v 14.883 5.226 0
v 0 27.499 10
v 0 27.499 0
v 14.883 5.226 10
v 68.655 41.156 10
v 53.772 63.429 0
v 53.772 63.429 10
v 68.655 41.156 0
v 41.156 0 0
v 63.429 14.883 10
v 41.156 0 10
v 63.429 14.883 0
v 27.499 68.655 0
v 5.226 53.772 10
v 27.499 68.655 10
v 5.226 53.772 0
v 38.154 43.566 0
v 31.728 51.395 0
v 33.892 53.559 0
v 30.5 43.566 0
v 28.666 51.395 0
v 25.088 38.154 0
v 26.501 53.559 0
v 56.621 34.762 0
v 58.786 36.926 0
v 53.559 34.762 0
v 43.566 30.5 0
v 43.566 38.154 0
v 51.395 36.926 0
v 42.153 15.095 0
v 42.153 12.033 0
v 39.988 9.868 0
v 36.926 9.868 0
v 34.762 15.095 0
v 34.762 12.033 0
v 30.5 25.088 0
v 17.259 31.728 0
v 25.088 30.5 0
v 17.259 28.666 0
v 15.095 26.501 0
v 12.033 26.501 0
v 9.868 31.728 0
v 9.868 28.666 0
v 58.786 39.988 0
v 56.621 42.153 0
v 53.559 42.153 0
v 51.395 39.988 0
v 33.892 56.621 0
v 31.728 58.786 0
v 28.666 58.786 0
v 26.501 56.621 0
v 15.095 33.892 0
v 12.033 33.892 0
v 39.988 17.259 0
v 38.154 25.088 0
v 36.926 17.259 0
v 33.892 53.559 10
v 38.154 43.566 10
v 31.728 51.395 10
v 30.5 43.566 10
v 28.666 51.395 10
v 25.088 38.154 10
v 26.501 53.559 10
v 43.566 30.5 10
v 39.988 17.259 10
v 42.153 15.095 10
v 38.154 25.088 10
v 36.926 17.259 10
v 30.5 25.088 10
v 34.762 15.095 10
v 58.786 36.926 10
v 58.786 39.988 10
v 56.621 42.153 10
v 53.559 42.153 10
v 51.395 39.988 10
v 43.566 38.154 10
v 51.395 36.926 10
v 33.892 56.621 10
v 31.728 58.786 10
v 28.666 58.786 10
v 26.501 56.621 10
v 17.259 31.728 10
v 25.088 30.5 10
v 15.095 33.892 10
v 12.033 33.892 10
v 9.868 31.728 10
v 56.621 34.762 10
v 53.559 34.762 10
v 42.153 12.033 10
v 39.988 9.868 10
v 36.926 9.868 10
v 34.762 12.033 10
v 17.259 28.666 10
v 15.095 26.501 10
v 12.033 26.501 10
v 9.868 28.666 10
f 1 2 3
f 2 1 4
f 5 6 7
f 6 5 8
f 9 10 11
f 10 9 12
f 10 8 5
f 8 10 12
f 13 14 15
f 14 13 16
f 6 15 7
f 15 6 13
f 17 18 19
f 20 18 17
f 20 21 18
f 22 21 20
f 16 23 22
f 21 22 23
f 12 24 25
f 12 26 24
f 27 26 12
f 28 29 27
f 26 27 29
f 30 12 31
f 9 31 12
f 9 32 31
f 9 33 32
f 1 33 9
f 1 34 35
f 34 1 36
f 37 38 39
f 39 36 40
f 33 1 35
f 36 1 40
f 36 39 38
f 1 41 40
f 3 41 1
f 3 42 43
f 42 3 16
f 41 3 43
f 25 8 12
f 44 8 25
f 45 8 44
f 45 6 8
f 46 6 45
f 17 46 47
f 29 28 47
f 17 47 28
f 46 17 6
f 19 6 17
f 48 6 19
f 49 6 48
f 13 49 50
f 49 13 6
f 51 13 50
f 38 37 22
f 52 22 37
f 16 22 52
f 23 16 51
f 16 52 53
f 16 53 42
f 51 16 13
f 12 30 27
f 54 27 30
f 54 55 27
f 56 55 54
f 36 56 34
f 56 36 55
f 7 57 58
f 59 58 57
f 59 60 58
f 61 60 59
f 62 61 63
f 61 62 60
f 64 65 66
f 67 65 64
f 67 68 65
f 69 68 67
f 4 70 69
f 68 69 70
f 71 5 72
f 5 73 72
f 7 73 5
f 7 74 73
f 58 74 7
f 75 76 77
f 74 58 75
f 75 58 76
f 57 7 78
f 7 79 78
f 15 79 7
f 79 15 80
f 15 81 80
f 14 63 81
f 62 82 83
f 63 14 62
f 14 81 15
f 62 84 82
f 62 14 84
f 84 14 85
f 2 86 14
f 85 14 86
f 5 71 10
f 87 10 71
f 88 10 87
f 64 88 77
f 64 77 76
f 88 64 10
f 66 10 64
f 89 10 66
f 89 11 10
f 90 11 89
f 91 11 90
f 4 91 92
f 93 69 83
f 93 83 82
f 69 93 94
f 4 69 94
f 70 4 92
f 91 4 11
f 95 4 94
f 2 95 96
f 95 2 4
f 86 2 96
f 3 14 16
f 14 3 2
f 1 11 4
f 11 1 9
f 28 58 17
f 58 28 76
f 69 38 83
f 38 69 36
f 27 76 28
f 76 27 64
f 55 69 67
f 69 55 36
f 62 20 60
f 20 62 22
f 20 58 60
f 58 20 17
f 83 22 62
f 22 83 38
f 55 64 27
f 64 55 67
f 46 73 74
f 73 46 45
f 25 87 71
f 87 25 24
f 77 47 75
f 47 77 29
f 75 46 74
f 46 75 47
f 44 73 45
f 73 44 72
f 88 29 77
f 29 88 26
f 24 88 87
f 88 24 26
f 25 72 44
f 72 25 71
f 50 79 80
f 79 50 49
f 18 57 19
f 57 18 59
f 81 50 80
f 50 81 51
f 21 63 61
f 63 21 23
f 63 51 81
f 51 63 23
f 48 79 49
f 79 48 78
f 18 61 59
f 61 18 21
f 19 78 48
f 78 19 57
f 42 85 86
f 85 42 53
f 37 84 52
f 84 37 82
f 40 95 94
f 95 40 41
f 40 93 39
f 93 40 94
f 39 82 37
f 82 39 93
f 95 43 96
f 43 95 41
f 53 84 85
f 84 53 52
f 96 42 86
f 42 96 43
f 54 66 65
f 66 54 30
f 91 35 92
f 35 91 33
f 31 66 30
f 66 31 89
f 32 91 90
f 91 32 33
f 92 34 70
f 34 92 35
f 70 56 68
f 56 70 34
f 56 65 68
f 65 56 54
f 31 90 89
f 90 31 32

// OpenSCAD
$fn = 32;

// ----------------------------------------------------------------------
// Polygon plate: 8-gon R35, 4 bolt windows
// ----------------------------------------------------------------------

// --- parameters (mm) ---
sides = 8;                // number of polygon sides
plate_r = 35;             // circumscribed radius of the polygon
bore_r = 10;              // centre bore radius
bolts = 4;                // number of bolt windows
ring_r = 21.17;           // bolt-circle radius
bolt_r = 4;               // bolt window radius
plate_t = 10;             // plate thickness, Z (extrusion height)

plate_d = 2 * plate_r;  // circumscribed diameter
bore_d = 2 * bore_r;  // centre bore diameter
bolt_d = 2 * bolt_r;  // bolt window diameter
ring_d = 2 * ring_r;  // bolt-circle diameter

profile = [[68.655, 41.156], [53.772, 63.429], [27.499, 68.655], [5.226, 53.772], [0, 27.499], [14.883, 5.226], [41.156, 0], [63.429, 14.883]];  // primary outline, 8 points, counter clockwise
void_1 = [[43.566, 38.154], [38.154, 43.566], [30.5, 43.566], [25.088, 38.154], [25.088, 30.5], [30.5, 25.088], [38.154, 25.088], [43.566, 30.5]];  // centre bore, 8 points
void_2 = [[58.786, 39.988], [56.621, 42.153], [53.559, 42.153], [51.395, 39.988], [51.395, 36.926], [53.559, 34.762], [56.621, 34.762], [58.786, 36.926]];  // bolt window 1, 8 points
void_3 = [[33.892, 56.621], [31.728, 58.786], [28.666, 58.786], [26.501, 56.621], [26.501, 53.559], [28.666, 51.395], [31.728, 51.395], [33.892, 53.559]];  // bolt window 2, 8 points
void_4 = [[17.259, 31.728], [15.095, 33.892], [12.033, 33.892], [9.868, 31.728], [9.868, 28.666], [12.033, 26.501], [15.095, 26.501], [17.259, 28.666]];  // bolt window 3, 8 points
void_5 = [[42.153, 15.095], [39.988, 17.259], [36.926, 17.259], [34.762, 15.095], [34.762, 12.033], [36.926, 9.868], [39.988, 9.868], [42.153, 12.033]];  // bolt window 4, 8 points

// --- the one profile operation ---
difference() {
  linear_extrude(height = plate_t) polygon(points = profile);
  translate([0, 0, -1])
    linear_extrude(height = plate_t + 2) polygon(points = void_1);
  translate([0, 0, -1])
    linear_extrude(height = plate_t + 2) polygon(points = void_2);
  translate([0, 0, -1])
    linear_extrude(height = plate_t + 2) polygon(points = void_3);
  translate([0, 0, -1])
    linear_extrude(height = plate_t + 2) polygon(points = void_4);
  translate([0, 0, -1])
    linear_extrude(height = plate_t + 2) polygon(points = void_5);
}
